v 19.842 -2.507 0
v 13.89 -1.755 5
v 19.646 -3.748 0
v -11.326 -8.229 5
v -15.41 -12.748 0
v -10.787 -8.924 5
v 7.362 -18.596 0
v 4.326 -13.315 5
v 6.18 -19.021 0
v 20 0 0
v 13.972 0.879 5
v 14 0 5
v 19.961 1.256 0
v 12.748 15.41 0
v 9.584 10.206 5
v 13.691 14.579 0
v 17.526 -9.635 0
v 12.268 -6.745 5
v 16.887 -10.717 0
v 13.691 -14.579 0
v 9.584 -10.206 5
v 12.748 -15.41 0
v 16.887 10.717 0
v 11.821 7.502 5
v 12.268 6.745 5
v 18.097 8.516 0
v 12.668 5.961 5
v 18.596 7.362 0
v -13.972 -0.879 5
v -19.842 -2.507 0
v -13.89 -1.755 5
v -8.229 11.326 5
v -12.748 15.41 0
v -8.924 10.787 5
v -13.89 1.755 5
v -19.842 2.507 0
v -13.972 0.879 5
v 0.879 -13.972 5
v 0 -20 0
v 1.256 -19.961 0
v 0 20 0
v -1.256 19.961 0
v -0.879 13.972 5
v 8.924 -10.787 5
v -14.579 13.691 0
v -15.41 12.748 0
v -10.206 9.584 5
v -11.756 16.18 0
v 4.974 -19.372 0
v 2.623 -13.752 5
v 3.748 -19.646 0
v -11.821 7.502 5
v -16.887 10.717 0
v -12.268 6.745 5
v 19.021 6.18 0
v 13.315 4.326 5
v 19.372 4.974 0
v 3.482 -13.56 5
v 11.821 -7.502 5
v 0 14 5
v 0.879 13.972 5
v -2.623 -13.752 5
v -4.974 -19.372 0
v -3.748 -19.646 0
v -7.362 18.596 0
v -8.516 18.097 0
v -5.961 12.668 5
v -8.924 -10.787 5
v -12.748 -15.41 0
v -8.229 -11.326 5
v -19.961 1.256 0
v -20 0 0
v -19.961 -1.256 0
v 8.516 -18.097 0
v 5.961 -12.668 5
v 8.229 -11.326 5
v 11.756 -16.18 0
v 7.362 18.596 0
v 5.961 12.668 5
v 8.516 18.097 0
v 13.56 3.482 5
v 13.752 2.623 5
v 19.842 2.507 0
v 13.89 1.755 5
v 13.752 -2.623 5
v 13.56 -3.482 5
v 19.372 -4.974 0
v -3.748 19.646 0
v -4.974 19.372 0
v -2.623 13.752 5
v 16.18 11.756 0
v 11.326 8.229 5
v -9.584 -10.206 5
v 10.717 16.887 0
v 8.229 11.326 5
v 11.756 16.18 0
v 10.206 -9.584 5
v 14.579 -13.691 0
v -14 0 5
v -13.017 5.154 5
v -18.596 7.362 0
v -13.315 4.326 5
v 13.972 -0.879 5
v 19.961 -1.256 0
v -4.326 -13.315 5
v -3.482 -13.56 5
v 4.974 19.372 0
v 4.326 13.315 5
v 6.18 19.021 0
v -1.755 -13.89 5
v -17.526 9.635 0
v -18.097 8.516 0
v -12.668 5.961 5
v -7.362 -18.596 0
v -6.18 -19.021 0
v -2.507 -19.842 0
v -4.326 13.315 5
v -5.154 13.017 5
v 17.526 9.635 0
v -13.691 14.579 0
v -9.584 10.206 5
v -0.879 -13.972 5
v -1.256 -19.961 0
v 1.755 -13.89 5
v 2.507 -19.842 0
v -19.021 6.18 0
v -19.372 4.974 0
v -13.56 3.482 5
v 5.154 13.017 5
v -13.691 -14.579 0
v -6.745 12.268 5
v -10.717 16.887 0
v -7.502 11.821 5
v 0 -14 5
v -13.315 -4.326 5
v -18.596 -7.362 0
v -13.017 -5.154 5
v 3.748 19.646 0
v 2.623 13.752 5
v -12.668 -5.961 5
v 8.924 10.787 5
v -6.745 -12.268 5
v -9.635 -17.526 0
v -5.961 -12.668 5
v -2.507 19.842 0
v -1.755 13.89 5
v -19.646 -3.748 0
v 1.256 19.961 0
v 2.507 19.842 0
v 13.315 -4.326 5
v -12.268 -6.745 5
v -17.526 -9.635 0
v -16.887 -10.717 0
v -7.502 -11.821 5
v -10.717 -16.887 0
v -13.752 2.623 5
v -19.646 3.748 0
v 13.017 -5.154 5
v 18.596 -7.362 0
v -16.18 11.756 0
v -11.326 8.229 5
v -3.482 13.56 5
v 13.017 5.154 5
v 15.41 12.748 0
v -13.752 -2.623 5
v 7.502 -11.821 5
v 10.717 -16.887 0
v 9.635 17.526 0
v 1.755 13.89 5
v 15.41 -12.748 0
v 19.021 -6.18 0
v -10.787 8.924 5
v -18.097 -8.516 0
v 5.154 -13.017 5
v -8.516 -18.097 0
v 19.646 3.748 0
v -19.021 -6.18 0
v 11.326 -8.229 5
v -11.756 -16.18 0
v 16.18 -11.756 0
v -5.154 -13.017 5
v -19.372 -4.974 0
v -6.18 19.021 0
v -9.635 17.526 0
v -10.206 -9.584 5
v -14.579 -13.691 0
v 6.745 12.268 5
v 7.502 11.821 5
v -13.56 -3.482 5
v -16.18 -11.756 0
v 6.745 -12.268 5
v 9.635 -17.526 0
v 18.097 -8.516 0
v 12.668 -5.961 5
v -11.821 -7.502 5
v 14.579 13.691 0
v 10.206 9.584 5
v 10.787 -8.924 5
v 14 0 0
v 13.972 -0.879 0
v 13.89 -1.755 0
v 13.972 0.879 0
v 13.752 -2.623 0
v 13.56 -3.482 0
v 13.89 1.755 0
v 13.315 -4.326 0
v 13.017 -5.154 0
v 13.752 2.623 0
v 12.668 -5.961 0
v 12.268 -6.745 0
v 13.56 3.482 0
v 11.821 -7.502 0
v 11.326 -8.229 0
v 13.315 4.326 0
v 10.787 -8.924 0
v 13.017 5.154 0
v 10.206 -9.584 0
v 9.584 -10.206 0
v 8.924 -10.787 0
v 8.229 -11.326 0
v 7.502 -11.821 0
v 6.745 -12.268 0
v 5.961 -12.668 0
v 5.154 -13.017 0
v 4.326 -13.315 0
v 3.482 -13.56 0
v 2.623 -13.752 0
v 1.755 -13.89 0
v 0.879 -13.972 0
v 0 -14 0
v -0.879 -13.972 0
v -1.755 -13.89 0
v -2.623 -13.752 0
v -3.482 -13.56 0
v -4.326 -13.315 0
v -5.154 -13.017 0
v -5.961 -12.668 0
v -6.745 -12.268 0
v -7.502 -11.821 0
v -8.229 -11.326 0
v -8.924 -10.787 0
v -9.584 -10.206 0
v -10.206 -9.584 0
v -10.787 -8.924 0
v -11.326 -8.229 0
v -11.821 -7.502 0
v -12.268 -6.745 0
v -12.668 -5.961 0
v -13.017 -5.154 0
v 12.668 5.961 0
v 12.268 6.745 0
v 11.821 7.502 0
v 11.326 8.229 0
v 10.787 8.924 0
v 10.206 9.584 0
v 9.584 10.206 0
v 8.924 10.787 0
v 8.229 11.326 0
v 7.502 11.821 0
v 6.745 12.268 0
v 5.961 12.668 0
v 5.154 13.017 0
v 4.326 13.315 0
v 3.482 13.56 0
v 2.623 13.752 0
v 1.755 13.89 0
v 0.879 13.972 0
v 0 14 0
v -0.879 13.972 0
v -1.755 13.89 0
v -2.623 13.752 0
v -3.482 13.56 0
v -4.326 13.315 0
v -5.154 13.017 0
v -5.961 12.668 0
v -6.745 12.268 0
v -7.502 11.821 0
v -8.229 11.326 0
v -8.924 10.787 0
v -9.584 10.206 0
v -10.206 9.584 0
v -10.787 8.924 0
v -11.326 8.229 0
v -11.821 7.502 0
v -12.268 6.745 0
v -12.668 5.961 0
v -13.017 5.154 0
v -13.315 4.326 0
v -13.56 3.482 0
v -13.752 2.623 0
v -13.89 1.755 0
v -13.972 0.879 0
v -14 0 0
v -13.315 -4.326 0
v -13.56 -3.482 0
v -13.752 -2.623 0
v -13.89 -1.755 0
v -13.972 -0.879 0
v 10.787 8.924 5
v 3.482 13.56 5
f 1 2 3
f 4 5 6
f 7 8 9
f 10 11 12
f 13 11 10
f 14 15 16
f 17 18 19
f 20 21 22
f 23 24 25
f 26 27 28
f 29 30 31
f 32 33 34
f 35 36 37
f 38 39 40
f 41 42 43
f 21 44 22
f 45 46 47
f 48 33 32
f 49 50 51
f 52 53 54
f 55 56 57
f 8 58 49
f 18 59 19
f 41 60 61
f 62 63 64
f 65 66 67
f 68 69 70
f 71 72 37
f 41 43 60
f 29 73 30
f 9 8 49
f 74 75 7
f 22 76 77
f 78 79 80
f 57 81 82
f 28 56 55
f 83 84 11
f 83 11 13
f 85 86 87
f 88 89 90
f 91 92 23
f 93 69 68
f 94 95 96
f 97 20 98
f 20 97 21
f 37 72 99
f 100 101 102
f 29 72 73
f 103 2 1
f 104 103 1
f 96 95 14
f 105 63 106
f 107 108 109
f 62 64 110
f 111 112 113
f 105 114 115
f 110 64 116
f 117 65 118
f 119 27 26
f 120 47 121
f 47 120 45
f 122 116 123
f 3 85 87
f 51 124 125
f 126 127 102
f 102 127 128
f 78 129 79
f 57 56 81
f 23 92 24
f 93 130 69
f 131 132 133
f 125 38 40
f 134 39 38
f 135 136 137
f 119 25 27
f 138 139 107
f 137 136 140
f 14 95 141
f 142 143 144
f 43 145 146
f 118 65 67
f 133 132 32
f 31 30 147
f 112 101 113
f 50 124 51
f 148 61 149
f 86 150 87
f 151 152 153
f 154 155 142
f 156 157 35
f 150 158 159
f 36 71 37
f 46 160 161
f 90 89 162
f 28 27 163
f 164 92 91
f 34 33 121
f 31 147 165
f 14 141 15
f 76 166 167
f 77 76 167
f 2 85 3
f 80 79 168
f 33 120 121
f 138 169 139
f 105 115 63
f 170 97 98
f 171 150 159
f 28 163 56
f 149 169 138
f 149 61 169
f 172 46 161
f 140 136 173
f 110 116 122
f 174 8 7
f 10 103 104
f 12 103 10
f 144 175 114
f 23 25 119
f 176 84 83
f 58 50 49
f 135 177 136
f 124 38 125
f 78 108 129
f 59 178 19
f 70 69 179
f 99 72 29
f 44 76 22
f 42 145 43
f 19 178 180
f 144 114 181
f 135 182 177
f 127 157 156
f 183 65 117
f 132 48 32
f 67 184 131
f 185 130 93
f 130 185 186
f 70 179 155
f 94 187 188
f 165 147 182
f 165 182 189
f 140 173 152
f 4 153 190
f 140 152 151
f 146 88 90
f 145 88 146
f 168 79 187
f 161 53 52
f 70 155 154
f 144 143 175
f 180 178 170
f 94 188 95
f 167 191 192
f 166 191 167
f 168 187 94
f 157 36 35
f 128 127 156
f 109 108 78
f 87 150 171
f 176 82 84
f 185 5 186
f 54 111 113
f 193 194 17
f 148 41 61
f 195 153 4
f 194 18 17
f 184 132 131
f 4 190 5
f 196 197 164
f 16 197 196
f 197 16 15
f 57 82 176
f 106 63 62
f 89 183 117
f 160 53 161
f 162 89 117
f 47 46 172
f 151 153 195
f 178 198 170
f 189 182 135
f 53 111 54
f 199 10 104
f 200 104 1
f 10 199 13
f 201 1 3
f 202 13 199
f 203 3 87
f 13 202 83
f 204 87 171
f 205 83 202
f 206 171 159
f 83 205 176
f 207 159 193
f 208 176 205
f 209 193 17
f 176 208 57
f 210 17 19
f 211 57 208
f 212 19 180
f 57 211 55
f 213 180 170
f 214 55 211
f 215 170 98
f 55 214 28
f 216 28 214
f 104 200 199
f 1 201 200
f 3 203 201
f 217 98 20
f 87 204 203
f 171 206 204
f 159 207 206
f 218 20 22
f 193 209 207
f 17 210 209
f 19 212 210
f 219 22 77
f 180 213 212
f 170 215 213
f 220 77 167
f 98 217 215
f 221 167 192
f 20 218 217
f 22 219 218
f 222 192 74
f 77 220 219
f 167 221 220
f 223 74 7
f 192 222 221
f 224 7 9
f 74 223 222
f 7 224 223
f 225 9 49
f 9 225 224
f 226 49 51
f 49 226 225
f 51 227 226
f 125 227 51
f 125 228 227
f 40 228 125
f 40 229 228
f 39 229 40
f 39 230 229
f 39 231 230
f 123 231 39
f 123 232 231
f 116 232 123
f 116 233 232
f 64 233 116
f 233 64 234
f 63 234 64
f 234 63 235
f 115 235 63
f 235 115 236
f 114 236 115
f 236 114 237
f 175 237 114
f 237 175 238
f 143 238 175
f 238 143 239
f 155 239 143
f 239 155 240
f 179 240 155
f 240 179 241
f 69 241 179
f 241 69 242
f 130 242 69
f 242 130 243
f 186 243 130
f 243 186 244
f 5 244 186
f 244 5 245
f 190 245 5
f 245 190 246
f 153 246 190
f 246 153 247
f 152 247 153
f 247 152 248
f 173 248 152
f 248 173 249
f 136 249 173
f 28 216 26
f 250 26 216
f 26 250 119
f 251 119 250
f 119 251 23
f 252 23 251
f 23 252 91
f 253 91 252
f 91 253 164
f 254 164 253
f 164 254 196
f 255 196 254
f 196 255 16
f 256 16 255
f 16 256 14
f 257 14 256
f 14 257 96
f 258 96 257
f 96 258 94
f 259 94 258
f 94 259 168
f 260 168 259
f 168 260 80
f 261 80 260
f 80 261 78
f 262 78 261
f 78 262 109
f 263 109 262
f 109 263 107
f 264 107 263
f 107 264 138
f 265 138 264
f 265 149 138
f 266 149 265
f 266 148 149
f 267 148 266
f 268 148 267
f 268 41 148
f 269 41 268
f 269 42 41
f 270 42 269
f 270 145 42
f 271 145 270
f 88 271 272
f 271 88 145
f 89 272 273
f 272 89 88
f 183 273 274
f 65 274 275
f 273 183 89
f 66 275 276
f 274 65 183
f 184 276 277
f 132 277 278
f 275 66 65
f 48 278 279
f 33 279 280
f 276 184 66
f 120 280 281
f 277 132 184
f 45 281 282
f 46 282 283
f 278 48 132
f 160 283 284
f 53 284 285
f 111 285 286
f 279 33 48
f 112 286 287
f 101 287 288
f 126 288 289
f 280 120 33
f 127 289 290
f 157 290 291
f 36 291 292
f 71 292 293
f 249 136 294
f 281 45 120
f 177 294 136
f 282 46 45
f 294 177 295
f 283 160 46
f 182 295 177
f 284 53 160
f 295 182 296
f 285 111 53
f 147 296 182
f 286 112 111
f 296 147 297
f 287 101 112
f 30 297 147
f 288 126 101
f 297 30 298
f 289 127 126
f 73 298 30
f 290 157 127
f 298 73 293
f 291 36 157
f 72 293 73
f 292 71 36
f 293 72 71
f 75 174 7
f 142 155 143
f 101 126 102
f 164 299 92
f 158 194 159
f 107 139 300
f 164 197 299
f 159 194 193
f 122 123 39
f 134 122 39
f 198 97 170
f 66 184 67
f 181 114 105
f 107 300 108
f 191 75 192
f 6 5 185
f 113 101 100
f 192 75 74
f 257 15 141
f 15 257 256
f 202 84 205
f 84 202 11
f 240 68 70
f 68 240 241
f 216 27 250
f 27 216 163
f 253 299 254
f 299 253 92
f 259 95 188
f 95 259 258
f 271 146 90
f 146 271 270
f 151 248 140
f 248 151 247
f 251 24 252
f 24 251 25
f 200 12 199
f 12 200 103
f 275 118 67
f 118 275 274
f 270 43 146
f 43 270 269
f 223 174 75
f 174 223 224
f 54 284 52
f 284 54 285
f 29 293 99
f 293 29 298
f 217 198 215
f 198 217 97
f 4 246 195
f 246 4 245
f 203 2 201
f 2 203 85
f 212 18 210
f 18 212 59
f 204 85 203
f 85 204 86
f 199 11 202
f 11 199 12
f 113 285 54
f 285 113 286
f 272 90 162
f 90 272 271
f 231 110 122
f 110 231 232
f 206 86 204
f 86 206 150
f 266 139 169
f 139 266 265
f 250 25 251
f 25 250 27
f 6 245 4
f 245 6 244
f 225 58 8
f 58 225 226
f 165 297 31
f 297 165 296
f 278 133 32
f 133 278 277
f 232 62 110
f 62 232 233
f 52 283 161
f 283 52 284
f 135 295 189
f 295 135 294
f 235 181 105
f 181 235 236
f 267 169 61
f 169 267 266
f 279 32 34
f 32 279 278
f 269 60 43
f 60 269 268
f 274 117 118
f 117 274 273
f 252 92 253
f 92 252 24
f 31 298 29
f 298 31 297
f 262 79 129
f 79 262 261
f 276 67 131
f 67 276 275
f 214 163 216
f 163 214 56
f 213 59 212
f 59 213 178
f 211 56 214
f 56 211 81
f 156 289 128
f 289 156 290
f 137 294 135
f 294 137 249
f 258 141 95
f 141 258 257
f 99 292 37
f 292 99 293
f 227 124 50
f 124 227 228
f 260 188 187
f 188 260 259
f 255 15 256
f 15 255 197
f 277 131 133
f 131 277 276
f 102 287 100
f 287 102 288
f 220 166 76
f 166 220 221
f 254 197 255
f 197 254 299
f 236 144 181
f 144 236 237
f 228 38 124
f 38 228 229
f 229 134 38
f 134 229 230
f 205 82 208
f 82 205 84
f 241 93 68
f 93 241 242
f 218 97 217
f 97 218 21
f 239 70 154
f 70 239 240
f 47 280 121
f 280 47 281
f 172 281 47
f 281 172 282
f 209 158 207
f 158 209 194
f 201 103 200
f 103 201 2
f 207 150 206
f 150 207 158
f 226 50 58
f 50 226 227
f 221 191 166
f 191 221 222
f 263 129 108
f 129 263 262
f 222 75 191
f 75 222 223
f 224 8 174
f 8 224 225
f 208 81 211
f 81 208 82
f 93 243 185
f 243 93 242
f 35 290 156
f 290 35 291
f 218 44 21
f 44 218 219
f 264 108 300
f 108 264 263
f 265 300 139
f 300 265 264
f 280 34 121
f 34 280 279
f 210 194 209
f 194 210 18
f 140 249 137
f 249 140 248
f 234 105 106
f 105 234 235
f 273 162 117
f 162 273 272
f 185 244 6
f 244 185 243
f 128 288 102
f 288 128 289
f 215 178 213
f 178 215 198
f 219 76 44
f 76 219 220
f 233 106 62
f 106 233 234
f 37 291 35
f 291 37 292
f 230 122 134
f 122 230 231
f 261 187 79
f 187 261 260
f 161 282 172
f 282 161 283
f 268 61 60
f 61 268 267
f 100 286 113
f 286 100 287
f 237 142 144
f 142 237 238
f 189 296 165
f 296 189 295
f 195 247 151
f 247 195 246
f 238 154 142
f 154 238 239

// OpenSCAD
/*
difference(){
    cylinder(50,14,14, $fn=100);
    cylinder(60,3.9,3.9,$fn=100);
    cylinder(10,7.25,7.25, $fn=6);
    translate([0,25,25]){
    rotate([90,0,0]){
        cylinder(50,2,2, $fn=100);
        }
    }
    translate([10,25,25]){
    rotate([90,0,0]){
        cylinder(50,2,2, $fn=100);
        }
    }
}
*/

difference(){
    cylinder(5, 20, 14, $fn=100); 
    cylinder(10,14,14, $fn=100);

}
